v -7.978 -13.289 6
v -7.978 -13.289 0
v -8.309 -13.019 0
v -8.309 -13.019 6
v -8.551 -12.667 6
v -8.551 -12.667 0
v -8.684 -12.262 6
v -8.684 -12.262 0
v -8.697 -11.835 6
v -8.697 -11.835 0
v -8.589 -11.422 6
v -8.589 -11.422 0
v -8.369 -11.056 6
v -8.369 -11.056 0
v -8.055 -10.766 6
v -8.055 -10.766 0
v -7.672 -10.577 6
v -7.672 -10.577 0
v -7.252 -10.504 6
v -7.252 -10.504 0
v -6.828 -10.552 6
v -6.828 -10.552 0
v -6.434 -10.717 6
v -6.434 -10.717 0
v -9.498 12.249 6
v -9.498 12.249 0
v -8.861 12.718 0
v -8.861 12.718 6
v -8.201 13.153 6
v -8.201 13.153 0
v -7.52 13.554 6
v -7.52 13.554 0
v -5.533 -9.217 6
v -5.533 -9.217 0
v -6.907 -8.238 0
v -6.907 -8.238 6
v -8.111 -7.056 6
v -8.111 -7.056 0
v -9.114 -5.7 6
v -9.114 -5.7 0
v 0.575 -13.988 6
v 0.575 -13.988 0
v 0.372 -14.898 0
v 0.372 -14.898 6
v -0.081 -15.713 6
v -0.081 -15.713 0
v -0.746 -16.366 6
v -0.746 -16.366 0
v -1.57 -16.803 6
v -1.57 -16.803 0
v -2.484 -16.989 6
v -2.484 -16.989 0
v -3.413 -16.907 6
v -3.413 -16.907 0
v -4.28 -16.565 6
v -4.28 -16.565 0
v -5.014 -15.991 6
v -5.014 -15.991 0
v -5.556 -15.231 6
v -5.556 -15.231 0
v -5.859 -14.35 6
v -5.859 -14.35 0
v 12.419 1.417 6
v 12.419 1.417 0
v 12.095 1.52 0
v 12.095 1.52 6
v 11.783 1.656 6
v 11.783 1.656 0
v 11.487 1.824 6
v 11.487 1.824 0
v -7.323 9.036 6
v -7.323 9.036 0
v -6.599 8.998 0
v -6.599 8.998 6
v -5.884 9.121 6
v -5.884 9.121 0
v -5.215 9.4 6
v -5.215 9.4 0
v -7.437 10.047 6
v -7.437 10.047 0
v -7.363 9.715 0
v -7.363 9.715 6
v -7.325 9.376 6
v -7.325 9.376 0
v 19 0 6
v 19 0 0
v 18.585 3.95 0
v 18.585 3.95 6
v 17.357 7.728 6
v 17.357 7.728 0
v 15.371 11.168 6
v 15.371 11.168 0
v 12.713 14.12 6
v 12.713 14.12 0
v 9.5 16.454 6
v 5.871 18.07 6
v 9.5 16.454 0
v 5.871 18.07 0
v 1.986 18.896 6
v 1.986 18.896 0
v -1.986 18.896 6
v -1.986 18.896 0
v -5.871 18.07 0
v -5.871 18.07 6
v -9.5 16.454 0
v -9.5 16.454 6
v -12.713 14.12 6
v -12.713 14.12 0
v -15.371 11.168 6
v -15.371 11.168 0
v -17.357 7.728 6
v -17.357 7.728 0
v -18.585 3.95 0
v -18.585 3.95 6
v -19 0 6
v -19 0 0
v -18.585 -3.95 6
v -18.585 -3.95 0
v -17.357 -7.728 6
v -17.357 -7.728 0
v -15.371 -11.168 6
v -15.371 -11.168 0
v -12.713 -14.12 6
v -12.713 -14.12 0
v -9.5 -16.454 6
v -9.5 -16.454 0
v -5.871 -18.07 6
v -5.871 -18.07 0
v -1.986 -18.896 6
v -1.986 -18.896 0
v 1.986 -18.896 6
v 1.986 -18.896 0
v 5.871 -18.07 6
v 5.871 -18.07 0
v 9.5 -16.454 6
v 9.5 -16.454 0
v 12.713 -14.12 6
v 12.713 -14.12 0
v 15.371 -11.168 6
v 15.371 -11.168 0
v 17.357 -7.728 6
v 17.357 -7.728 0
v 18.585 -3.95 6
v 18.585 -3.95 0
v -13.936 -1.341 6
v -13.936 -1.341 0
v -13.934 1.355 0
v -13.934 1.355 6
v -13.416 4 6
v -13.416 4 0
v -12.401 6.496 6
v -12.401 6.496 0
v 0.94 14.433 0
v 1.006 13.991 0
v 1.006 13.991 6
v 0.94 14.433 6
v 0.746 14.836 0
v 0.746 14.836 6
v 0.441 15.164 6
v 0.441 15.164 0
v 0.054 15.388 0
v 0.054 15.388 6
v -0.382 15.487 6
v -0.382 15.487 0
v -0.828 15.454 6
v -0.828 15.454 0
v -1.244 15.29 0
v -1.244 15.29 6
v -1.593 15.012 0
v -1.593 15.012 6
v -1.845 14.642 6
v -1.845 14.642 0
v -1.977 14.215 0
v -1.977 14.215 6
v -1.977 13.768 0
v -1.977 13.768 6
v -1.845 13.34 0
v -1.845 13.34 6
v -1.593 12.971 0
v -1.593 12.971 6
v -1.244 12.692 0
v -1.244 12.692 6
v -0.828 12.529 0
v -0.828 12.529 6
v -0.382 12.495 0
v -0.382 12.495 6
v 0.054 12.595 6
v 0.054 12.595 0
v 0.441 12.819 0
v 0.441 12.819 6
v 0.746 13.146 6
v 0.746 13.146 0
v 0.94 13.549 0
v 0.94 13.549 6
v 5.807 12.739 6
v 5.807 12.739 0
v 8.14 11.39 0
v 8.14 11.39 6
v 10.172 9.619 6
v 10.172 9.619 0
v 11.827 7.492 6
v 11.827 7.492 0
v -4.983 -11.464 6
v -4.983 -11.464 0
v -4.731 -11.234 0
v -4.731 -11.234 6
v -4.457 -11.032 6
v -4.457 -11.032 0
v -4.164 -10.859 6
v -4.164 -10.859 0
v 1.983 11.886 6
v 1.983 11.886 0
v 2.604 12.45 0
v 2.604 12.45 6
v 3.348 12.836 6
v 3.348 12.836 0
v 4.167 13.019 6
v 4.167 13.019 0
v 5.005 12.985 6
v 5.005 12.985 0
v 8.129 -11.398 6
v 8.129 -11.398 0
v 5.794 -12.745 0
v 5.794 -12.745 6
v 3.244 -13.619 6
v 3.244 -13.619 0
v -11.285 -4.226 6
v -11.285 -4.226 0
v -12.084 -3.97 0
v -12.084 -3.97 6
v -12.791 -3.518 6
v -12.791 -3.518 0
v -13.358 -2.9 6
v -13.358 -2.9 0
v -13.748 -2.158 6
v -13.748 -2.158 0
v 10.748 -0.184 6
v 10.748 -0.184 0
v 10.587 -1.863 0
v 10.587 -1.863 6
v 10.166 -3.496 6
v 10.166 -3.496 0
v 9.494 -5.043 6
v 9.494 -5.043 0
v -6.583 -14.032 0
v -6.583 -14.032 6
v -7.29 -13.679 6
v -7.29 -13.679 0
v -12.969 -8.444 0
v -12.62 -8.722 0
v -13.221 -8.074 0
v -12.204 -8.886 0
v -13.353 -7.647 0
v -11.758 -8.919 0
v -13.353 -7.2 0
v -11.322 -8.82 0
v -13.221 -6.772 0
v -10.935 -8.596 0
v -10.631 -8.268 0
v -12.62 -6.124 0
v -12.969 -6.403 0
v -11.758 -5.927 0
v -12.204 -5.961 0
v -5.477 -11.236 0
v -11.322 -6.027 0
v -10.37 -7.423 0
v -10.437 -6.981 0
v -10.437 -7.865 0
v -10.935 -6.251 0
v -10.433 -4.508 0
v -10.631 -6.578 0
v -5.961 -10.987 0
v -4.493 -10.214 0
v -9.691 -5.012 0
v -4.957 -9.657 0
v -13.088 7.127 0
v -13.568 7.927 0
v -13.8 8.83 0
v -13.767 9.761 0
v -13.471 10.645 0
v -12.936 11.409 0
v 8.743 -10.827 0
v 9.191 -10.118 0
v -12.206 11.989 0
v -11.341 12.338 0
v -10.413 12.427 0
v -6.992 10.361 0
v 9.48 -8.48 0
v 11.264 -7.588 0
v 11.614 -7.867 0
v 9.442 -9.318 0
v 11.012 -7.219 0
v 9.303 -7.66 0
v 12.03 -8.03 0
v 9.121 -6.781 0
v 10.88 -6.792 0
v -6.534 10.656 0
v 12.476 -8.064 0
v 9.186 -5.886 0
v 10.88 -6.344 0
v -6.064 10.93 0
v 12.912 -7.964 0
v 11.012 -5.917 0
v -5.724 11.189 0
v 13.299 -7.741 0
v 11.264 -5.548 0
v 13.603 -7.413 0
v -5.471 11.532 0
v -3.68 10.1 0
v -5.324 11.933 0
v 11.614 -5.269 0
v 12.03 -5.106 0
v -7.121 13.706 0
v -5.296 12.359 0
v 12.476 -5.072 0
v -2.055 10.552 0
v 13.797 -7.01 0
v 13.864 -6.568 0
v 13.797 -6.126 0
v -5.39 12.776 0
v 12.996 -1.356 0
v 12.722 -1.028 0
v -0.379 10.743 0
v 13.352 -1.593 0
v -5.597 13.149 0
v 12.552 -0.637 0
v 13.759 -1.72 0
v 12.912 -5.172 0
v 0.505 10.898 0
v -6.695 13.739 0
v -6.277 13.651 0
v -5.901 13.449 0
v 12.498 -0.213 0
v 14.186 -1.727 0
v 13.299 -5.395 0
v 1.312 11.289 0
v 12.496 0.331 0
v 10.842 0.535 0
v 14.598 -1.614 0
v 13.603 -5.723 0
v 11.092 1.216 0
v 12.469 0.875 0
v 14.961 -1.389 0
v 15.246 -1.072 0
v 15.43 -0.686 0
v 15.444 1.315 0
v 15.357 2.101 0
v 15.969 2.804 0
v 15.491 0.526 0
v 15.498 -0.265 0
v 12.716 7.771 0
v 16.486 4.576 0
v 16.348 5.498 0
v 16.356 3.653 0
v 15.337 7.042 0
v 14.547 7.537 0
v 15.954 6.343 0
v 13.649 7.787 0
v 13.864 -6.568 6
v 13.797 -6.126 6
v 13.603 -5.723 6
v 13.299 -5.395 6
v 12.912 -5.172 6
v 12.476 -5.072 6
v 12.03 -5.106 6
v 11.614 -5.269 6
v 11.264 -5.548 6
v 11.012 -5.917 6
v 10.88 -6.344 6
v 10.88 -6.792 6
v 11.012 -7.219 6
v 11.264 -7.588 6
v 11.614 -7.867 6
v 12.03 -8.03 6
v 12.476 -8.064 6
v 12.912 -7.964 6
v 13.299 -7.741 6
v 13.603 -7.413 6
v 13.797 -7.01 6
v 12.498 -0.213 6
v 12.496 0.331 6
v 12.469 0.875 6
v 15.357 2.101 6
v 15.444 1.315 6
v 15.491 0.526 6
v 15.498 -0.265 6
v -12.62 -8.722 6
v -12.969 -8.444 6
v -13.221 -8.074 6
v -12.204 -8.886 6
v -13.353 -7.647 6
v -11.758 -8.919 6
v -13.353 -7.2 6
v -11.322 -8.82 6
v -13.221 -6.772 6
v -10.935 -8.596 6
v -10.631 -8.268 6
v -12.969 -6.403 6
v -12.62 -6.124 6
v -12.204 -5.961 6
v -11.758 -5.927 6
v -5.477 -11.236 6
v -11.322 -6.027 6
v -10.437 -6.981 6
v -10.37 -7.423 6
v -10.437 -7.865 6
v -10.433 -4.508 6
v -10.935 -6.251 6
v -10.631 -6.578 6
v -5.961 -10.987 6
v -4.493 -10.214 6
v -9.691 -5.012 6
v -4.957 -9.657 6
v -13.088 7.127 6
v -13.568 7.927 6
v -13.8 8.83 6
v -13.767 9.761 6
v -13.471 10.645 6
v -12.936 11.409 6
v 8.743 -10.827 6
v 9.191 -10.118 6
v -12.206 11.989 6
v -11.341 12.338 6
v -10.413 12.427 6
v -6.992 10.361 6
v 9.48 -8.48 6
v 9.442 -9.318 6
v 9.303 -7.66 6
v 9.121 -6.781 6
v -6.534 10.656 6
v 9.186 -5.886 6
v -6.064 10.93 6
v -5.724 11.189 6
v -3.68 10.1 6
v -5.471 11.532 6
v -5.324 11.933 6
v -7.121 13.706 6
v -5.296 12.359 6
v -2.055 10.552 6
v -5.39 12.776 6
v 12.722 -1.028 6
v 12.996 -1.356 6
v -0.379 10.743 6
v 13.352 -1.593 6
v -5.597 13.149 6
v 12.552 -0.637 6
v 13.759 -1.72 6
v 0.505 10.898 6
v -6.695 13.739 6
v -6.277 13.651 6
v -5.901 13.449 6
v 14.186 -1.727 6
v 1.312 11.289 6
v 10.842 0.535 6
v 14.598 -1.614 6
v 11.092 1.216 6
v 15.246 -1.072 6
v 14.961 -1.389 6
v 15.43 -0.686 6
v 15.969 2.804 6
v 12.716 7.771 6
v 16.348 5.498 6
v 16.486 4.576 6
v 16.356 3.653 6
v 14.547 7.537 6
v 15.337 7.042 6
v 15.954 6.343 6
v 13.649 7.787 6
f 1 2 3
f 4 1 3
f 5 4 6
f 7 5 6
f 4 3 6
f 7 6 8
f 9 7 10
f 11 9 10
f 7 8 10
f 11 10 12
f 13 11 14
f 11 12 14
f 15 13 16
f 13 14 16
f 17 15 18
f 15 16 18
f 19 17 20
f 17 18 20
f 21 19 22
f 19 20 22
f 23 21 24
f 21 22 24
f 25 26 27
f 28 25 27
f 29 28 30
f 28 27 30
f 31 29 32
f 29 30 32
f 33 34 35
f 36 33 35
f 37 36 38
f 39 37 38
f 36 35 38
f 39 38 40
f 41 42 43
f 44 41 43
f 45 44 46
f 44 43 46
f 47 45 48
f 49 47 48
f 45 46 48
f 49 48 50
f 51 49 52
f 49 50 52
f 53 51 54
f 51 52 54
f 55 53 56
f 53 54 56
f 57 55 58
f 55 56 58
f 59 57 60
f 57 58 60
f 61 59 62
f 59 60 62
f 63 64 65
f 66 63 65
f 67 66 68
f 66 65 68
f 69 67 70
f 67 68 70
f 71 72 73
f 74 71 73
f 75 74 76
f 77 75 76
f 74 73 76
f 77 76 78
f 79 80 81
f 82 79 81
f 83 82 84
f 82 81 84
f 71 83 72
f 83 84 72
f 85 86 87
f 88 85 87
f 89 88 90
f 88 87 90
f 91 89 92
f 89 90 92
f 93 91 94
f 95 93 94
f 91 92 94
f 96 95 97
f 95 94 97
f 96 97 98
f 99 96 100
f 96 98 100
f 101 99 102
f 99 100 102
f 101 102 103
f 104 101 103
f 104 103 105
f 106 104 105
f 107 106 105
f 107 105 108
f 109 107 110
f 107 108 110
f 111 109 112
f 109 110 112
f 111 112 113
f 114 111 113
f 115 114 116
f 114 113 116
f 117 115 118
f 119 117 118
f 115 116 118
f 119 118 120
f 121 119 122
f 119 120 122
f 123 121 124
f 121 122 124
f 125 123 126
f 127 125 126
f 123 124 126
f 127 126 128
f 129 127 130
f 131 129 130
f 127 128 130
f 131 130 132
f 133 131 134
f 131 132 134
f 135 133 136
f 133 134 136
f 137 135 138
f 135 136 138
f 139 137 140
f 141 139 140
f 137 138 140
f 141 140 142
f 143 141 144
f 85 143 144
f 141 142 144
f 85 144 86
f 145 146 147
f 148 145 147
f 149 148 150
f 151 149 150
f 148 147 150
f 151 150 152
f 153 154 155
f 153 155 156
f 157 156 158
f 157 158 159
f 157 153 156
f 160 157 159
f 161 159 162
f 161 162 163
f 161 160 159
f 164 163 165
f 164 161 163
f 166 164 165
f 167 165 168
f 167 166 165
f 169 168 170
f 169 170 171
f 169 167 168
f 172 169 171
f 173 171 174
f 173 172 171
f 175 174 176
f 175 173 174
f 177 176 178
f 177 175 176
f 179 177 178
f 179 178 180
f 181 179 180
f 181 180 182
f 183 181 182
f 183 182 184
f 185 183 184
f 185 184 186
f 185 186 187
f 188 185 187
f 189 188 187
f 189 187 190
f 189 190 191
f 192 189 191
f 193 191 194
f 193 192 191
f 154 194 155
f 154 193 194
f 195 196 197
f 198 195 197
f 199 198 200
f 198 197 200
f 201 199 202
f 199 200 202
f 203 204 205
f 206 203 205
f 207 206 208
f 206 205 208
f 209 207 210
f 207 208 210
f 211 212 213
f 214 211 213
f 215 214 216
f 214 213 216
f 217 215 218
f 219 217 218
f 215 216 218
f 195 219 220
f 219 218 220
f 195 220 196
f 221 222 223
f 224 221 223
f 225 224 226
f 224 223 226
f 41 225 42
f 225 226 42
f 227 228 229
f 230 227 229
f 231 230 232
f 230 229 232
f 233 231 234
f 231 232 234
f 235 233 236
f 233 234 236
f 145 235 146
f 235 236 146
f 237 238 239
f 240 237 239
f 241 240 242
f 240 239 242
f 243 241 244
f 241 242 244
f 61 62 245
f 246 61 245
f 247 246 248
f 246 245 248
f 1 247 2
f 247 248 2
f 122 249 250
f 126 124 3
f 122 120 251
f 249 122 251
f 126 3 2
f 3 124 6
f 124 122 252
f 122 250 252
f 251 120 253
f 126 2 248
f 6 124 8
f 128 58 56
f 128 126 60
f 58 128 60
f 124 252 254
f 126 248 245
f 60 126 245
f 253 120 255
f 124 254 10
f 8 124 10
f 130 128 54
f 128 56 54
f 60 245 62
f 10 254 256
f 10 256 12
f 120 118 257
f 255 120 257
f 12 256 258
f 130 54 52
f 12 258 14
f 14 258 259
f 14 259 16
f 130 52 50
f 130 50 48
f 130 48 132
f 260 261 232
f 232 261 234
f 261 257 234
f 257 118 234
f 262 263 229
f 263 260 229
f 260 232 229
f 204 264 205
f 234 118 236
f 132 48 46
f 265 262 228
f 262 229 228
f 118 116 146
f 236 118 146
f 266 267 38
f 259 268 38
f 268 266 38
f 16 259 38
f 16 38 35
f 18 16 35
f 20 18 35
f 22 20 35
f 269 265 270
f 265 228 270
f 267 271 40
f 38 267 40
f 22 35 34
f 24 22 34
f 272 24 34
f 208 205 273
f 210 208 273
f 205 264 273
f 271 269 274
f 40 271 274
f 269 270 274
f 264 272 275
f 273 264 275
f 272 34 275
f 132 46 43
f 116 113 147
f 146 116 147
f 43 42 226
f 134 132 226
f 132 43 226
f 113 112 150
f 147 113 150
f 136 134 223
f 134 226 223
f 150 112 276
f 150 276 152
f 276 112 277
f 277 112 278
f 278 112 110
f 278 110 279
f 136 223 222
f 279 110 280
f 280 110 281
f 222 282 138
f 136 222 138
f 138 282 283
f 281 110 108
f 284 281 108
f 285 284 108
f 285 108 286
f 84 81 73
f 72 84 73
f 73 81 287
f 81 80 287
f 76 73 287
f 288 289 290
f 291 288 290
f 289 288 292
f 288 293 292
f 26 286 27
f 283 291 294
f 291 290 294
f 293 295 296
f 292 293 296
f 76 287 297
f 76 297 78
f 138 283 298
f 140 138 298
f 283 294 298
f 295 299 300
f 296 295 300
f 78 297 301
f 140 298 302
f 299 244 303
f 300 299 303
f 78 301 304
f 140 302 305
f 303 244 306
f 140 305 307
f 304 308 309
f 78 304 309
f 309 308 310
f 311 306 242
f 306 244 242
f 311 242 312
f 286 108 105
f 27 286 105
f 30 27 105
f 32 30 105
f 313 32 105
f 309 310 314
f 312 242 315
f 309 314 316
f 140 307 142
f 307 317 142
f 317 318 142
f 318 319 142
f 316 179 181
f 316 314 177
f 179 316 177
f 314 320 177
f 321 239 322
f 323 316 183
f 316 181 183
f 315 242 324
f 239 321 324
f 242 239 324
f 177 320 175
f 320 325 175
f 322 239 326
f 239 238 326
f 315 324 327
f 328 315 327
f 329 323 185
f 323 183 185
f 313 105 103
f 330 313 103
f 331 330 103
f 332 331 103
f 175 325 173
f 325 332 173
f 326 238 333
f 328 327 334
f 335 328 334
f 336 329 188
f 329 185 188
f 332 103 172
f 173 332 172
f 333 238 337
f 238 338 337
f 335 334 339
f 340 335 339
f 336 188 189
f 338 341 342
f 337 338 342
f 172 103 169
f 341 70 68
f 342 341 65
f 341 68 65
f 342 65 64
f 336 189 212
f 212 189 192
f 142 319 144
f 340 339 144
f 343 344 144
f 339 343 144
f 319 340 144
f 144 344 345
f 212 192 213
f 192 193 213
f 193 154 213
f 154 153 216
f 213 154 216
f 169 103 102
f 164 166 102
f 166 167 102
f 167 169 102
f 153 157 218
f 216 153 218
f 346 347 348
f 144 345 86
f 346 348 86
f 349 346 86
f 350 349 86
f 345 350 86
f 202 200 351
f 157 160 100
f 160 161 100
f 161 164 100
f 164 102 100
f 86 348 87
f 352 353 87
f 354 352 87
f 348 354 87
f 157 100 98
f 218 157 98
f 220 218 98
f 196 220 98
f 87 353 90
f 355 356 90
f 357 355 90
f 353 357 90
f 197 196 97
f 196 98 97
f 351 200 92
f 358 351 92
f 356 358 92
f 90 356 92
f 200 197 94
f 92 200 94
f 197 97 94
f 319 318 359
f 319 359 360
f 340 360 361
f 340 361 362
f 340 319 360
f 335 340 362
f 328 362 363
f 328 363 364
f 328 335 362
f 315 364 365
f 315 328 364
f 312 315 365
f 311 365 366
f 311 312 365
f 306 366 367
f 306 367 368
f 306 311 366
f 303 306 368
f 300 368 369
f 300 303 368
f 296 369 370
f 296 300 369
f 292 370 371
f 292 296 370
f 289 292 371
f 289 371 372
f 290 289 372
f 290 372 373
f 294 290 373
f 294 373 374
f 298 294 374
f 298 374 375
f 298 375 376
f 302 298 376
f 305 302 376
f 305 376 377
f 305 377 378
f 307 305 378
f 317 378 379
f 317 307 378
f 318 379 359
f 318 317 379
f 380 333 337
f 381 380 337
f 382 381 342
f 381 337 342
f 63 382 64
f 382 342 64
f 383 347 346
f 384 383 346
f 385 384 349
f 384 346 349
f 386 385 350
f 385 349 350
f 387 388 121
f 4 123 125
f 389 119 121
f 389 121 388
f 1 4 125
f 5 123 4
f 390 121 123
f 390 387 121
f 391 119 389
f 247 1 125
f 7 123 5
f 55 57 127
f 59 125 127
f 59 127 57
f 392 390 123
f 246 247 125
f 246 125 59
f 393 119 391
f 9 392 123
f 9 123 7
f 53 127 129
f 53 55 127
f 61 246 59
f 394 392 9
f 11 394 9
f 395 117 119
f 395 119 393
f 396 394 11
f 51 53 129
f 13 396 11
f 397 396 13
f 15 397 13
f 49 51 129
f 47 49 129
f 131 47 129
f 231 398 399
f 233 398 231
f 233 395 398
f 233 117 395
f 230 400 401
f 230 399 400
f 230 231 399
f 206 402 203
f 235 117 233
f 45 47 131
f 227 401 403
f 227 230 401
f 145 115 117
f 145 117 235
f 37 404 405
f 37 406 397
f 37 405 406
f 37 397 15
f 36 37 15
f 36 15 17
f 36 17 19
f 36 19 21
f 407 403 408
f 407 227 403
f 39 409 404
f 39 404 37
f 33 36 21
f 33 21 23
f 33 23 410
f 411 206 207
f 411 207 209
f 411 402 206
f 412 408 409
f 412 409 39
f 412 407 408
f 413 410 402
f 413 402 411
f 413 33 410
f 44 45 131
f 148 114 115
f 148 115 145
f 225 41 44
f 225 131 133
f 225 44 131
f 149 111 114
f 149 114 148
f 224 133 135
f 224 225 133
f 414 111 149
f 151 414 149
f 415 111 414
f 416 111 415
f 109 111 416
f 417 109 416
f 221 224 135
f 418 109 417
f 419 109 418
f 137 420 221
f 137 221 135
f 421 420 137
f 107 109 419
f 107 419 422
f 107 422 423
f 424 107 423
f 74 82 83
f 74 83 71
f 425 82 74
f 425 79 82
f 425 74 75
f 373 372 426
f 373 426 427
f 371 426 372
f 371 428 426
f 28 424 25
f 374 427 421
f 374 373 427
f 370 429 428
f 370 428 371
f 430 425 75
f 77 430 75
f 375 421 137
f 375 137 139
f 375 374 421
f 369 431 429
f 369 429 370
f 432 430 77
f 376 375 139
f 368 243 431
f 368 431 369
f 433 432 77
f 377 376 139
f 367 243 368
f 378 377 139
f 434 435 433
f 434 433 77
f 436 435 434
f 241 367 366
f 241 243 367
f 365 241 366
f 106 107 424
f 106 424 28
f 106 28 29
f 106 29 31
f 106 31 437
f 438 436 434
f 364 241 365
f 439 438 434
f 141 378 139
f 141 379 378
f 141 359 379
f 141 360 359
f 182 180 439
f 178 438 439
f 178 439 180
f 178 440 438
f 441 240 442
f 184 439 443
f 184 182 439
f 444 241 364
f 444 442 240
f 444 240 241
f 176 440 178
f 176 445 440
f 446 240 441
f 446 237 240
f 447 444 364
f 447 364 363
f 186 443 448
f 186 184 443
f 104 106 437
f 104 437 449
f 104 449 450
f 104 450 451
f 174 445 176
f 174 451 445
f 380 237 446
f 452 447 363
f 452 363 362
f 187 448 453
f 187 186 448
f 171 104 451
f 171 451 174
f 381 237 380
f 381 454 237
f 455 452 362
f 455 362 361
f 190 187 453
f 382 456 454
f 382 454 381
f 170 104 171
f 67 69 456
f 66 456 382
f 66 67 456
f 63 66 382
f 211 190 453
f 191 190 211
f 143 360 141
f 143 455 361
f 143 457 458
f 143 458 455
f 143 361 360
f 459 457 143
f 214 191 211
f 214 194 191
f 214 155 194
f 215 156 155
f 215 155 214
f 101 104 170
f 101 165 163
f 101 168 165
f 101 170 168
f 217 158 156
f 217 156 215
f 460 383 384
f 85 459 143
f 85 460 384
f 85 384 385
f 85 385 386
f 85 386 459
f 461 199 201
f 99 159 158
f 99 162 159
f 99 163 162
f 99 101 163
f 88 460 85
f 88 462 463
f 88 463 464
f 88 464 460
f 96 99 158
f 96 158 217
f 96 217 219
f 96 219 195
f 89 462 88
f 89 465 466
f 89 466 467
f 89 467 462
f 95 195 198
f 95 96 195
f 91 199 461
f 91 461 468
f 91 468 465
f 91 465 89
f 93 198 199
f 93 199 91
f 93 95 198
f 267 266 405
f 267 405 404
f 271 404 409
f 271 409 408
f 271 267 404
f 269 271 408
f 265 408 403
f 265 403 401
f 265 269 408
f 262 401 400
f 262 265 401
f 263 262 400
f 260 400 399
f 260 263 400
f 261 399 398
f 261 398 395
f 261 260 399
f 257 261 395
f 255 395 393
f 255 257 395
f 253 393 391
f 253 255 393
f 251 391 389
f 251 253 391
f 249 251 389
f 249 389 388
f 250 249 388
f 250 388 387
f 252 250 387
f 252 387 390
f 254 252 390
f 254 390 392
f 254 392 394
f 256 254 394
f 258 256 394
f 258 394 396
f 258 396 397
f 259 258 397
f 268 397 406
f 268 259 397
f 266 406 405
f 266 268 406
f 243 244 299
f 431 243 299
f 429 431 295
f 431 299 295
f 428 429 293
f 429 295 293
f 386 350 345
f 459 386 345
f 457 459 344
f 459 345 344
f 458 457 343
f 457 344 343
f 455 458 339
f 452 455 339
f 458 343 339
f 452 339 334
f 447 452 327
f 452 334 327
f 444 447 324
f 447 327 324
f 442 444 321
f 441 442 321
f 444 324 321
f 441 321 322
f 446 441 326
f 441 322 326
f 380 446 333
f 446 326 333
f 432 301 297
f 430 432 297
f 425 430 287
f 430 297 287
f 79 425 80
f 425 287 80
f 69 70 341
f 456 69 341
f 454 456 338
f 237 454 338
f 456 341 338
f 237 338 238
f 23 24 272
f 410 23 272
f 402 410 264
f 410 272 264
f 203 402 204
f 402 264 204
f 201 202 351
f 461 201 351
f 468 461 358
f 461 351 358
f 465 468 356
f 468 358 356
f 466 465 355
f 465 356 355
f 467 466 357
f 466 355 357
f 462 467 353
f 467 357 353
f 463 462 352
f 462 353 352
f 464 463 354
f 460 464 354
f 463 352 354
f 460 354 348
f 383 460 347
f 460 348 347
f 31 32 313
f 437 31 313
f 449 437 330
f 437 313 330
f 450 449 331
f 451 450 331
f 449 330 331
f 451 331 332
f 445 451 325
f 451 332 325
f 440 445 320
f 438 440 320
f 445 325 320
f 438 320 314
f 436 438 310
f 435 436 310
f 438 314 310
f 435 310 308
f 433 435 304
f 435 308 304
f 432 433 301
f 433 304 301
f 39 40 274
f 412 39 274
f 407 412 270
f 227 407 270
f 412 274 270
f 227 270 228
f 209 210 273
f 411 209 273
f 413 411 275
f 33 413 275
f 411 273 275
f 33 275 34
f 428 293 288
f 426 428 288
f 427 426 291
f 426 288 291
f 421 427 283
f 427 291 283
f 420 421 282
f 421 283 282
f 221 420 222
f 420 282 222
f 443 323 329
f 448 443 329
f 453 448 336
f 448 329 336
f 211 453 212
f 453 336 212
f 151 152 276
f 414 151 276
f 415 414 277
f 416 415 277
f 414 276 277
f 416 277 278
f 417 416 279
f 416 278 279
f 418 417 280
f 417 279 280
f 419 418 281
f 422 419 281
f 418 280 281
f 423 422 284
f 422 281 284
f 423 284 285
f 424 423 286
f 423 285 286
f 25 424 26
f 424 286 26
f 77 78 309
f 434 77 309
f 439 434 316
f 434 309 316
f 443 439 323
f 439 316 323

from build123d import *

# Parameters (mm, degrees)
ESQUISSE1_R        = 19
ESQUISSE1_R_2      = 1.5
BOSS_EXTRU_2_DEPTH = 6


with BuildPart() as part:
    # Esquisse1 → Boss.-Extru.2 (new body)
    with BuildSketch(Plane.XY):
        Circle(ESQUISSE1_R)
        with Locations((-0.493805045, 13.991288596)):
            Circle(ESQUISSE1_R_2, mode=Mode.SUBTRACT)
        with Locations((12.363713879, -6.567996584)):
            Circle(ESQUISSE1_R_2, mode=Mode.SUBTRACT)
        with Locations((-11.869908833, -7.423292012)):
            Circle(ESQUISSE1_R_2, mode=Mode.SUBTRACT)
        with BuildLine():
            ThreePointArc((-0.379171731, 10.743310886), (0.922172629, 11.065966866), (1.982535482, 11.886475637))
            ThreePointArc((1.982535482, 11.886475637), (3.751818189, 12.953817976), (5.806908291, 12.738909534))
            ThreePointArc((5.806908291, 12.738909534), (9.198945104, 10.553644346), (11.826845368, 7.491710662))
            ThreePointArc((11.826845368, 7.491710662), (15.95449234, 6.343310094), (15.356979769, 2.100755188))
            ThreePointArc((15.356979769, 2.100755188), (15.472630931, 0.920701949), (15.497738971, -0.264739076))
            ThreePointArc((15.497738971, -0.264739076), (13.97233787, -1.738900356), (12.49817659, -0.213499254))
            ThreePointArc((12.49817659, -0.213499254), (12.485444687, 0.603051388), (12.419421545, 1.417028044))
            ThreePointArc((12.419421545, 1.417028044), (11.936947212, 1.58360629), (11.486503898, 1.823670062))
            ThreePointArc((11.486503898, 1.823670062), (10.947627516, 0.882480264), (10.748431867, -0.183609359))
            ThreePointArc((10.748431867, -0.183609359), (10.408589086, -2.687707806), (9.493566014, -5.043283091))
            ThreePointArc((9.493566014, -5.043283091), (9.122322109, -6.331608356), (9.302722122, -7.66016391))
            ThreePointArc((9.302722122, -7.66016391), (9.342426349, -9.72607885), (8.128765127, -11.398384864))
            ThreePointArc((8.128765127, -11.398384864), (4.540251554, -13.243342321), (0.574589068, -13.988203866))
            ThreePointArc((0.574589068, -13.988203866), (-2.483778485, -16.988650718), (-5.859182525, -14.3499122))
            ThreePointArc((-5.859182525, -14.3499122), (-6.938964188, -13.860042424), (-7.97814025, -13.289066113))
            ThreePointArc((-7.97814025, -13.289066113), (-8.492100818, -11.230949368), (-6.433984073, -10.7169888))
            ThreePointArc((-6.433984073, -10.7169888), (-5.720464522, -11.11423797), (-4.982528488, -11.464048581))
            ThreePointArc((-4.982528488, -11.464048581), (-4.597030329, -11.129502674), (-4.163907347, -10.859439207))
            ThreePointArc((-4.163907347, -10.859439207), (-4.709563431, -9.922163672), (-5.533226303, -9.216610368))
            ThreePointArc((-5.533226303, -9.216610368), (-7.53191778, -7.670248663), (-9.114394283, -5.700027795))
            ThreePointArc((-9.114394283, -5.700027795), (-10.044494737, -4.73435851), (-11.285257604, -4.226311727))
            ThreePointArc((-11.285257604, -4.226311727), (-13.094244538, -3.227739126), (-13.935673418, -1.34052467))
            ThreePointArc((-13.935673418, -1.34052467), (-13.739196658, 2.689697975), (-12.401434435, 6.496493204))
            ThreePointArc((-12.401434435, 6.496493204), (-13.470713855, 10.645340625), (-9.497797245, 12.249157012))
            ThreePointArc((-9.497797245, 12.249157012), (-8.533666743, 12.939340475), (-7.519598721, 13.553805188))
            ThreePointArc((-7.519598721, 13.553805188), (-5.480237052, 12.969849724), (-6.064192517, 10.930488055))
            ThreePointArc((-6.064192517, 10.930488055), (-6.764980165, 10.511186582), (-7.436893057, 10.047020536))
            ThreePointArc((-7.436893057, 10.047020536), (-7.339916883, 9.545896384), (-7.32259655, 9.035769145))
            ThreePointArc((-7.32259655, 9.035769145), (-6.238064085, 9.039683408), (-5.215205564, 9.400219727))
            ThreePointArc((-5.215205564, 9.400219727), (-2.876671305, 10.357956468), (-0.379171731, 10.743310886))
        make_face(mode=Mode.SUBTRACT)
    extrude(amount=BOSS_EXTRU_2_DEPTH)


solid = part.part
